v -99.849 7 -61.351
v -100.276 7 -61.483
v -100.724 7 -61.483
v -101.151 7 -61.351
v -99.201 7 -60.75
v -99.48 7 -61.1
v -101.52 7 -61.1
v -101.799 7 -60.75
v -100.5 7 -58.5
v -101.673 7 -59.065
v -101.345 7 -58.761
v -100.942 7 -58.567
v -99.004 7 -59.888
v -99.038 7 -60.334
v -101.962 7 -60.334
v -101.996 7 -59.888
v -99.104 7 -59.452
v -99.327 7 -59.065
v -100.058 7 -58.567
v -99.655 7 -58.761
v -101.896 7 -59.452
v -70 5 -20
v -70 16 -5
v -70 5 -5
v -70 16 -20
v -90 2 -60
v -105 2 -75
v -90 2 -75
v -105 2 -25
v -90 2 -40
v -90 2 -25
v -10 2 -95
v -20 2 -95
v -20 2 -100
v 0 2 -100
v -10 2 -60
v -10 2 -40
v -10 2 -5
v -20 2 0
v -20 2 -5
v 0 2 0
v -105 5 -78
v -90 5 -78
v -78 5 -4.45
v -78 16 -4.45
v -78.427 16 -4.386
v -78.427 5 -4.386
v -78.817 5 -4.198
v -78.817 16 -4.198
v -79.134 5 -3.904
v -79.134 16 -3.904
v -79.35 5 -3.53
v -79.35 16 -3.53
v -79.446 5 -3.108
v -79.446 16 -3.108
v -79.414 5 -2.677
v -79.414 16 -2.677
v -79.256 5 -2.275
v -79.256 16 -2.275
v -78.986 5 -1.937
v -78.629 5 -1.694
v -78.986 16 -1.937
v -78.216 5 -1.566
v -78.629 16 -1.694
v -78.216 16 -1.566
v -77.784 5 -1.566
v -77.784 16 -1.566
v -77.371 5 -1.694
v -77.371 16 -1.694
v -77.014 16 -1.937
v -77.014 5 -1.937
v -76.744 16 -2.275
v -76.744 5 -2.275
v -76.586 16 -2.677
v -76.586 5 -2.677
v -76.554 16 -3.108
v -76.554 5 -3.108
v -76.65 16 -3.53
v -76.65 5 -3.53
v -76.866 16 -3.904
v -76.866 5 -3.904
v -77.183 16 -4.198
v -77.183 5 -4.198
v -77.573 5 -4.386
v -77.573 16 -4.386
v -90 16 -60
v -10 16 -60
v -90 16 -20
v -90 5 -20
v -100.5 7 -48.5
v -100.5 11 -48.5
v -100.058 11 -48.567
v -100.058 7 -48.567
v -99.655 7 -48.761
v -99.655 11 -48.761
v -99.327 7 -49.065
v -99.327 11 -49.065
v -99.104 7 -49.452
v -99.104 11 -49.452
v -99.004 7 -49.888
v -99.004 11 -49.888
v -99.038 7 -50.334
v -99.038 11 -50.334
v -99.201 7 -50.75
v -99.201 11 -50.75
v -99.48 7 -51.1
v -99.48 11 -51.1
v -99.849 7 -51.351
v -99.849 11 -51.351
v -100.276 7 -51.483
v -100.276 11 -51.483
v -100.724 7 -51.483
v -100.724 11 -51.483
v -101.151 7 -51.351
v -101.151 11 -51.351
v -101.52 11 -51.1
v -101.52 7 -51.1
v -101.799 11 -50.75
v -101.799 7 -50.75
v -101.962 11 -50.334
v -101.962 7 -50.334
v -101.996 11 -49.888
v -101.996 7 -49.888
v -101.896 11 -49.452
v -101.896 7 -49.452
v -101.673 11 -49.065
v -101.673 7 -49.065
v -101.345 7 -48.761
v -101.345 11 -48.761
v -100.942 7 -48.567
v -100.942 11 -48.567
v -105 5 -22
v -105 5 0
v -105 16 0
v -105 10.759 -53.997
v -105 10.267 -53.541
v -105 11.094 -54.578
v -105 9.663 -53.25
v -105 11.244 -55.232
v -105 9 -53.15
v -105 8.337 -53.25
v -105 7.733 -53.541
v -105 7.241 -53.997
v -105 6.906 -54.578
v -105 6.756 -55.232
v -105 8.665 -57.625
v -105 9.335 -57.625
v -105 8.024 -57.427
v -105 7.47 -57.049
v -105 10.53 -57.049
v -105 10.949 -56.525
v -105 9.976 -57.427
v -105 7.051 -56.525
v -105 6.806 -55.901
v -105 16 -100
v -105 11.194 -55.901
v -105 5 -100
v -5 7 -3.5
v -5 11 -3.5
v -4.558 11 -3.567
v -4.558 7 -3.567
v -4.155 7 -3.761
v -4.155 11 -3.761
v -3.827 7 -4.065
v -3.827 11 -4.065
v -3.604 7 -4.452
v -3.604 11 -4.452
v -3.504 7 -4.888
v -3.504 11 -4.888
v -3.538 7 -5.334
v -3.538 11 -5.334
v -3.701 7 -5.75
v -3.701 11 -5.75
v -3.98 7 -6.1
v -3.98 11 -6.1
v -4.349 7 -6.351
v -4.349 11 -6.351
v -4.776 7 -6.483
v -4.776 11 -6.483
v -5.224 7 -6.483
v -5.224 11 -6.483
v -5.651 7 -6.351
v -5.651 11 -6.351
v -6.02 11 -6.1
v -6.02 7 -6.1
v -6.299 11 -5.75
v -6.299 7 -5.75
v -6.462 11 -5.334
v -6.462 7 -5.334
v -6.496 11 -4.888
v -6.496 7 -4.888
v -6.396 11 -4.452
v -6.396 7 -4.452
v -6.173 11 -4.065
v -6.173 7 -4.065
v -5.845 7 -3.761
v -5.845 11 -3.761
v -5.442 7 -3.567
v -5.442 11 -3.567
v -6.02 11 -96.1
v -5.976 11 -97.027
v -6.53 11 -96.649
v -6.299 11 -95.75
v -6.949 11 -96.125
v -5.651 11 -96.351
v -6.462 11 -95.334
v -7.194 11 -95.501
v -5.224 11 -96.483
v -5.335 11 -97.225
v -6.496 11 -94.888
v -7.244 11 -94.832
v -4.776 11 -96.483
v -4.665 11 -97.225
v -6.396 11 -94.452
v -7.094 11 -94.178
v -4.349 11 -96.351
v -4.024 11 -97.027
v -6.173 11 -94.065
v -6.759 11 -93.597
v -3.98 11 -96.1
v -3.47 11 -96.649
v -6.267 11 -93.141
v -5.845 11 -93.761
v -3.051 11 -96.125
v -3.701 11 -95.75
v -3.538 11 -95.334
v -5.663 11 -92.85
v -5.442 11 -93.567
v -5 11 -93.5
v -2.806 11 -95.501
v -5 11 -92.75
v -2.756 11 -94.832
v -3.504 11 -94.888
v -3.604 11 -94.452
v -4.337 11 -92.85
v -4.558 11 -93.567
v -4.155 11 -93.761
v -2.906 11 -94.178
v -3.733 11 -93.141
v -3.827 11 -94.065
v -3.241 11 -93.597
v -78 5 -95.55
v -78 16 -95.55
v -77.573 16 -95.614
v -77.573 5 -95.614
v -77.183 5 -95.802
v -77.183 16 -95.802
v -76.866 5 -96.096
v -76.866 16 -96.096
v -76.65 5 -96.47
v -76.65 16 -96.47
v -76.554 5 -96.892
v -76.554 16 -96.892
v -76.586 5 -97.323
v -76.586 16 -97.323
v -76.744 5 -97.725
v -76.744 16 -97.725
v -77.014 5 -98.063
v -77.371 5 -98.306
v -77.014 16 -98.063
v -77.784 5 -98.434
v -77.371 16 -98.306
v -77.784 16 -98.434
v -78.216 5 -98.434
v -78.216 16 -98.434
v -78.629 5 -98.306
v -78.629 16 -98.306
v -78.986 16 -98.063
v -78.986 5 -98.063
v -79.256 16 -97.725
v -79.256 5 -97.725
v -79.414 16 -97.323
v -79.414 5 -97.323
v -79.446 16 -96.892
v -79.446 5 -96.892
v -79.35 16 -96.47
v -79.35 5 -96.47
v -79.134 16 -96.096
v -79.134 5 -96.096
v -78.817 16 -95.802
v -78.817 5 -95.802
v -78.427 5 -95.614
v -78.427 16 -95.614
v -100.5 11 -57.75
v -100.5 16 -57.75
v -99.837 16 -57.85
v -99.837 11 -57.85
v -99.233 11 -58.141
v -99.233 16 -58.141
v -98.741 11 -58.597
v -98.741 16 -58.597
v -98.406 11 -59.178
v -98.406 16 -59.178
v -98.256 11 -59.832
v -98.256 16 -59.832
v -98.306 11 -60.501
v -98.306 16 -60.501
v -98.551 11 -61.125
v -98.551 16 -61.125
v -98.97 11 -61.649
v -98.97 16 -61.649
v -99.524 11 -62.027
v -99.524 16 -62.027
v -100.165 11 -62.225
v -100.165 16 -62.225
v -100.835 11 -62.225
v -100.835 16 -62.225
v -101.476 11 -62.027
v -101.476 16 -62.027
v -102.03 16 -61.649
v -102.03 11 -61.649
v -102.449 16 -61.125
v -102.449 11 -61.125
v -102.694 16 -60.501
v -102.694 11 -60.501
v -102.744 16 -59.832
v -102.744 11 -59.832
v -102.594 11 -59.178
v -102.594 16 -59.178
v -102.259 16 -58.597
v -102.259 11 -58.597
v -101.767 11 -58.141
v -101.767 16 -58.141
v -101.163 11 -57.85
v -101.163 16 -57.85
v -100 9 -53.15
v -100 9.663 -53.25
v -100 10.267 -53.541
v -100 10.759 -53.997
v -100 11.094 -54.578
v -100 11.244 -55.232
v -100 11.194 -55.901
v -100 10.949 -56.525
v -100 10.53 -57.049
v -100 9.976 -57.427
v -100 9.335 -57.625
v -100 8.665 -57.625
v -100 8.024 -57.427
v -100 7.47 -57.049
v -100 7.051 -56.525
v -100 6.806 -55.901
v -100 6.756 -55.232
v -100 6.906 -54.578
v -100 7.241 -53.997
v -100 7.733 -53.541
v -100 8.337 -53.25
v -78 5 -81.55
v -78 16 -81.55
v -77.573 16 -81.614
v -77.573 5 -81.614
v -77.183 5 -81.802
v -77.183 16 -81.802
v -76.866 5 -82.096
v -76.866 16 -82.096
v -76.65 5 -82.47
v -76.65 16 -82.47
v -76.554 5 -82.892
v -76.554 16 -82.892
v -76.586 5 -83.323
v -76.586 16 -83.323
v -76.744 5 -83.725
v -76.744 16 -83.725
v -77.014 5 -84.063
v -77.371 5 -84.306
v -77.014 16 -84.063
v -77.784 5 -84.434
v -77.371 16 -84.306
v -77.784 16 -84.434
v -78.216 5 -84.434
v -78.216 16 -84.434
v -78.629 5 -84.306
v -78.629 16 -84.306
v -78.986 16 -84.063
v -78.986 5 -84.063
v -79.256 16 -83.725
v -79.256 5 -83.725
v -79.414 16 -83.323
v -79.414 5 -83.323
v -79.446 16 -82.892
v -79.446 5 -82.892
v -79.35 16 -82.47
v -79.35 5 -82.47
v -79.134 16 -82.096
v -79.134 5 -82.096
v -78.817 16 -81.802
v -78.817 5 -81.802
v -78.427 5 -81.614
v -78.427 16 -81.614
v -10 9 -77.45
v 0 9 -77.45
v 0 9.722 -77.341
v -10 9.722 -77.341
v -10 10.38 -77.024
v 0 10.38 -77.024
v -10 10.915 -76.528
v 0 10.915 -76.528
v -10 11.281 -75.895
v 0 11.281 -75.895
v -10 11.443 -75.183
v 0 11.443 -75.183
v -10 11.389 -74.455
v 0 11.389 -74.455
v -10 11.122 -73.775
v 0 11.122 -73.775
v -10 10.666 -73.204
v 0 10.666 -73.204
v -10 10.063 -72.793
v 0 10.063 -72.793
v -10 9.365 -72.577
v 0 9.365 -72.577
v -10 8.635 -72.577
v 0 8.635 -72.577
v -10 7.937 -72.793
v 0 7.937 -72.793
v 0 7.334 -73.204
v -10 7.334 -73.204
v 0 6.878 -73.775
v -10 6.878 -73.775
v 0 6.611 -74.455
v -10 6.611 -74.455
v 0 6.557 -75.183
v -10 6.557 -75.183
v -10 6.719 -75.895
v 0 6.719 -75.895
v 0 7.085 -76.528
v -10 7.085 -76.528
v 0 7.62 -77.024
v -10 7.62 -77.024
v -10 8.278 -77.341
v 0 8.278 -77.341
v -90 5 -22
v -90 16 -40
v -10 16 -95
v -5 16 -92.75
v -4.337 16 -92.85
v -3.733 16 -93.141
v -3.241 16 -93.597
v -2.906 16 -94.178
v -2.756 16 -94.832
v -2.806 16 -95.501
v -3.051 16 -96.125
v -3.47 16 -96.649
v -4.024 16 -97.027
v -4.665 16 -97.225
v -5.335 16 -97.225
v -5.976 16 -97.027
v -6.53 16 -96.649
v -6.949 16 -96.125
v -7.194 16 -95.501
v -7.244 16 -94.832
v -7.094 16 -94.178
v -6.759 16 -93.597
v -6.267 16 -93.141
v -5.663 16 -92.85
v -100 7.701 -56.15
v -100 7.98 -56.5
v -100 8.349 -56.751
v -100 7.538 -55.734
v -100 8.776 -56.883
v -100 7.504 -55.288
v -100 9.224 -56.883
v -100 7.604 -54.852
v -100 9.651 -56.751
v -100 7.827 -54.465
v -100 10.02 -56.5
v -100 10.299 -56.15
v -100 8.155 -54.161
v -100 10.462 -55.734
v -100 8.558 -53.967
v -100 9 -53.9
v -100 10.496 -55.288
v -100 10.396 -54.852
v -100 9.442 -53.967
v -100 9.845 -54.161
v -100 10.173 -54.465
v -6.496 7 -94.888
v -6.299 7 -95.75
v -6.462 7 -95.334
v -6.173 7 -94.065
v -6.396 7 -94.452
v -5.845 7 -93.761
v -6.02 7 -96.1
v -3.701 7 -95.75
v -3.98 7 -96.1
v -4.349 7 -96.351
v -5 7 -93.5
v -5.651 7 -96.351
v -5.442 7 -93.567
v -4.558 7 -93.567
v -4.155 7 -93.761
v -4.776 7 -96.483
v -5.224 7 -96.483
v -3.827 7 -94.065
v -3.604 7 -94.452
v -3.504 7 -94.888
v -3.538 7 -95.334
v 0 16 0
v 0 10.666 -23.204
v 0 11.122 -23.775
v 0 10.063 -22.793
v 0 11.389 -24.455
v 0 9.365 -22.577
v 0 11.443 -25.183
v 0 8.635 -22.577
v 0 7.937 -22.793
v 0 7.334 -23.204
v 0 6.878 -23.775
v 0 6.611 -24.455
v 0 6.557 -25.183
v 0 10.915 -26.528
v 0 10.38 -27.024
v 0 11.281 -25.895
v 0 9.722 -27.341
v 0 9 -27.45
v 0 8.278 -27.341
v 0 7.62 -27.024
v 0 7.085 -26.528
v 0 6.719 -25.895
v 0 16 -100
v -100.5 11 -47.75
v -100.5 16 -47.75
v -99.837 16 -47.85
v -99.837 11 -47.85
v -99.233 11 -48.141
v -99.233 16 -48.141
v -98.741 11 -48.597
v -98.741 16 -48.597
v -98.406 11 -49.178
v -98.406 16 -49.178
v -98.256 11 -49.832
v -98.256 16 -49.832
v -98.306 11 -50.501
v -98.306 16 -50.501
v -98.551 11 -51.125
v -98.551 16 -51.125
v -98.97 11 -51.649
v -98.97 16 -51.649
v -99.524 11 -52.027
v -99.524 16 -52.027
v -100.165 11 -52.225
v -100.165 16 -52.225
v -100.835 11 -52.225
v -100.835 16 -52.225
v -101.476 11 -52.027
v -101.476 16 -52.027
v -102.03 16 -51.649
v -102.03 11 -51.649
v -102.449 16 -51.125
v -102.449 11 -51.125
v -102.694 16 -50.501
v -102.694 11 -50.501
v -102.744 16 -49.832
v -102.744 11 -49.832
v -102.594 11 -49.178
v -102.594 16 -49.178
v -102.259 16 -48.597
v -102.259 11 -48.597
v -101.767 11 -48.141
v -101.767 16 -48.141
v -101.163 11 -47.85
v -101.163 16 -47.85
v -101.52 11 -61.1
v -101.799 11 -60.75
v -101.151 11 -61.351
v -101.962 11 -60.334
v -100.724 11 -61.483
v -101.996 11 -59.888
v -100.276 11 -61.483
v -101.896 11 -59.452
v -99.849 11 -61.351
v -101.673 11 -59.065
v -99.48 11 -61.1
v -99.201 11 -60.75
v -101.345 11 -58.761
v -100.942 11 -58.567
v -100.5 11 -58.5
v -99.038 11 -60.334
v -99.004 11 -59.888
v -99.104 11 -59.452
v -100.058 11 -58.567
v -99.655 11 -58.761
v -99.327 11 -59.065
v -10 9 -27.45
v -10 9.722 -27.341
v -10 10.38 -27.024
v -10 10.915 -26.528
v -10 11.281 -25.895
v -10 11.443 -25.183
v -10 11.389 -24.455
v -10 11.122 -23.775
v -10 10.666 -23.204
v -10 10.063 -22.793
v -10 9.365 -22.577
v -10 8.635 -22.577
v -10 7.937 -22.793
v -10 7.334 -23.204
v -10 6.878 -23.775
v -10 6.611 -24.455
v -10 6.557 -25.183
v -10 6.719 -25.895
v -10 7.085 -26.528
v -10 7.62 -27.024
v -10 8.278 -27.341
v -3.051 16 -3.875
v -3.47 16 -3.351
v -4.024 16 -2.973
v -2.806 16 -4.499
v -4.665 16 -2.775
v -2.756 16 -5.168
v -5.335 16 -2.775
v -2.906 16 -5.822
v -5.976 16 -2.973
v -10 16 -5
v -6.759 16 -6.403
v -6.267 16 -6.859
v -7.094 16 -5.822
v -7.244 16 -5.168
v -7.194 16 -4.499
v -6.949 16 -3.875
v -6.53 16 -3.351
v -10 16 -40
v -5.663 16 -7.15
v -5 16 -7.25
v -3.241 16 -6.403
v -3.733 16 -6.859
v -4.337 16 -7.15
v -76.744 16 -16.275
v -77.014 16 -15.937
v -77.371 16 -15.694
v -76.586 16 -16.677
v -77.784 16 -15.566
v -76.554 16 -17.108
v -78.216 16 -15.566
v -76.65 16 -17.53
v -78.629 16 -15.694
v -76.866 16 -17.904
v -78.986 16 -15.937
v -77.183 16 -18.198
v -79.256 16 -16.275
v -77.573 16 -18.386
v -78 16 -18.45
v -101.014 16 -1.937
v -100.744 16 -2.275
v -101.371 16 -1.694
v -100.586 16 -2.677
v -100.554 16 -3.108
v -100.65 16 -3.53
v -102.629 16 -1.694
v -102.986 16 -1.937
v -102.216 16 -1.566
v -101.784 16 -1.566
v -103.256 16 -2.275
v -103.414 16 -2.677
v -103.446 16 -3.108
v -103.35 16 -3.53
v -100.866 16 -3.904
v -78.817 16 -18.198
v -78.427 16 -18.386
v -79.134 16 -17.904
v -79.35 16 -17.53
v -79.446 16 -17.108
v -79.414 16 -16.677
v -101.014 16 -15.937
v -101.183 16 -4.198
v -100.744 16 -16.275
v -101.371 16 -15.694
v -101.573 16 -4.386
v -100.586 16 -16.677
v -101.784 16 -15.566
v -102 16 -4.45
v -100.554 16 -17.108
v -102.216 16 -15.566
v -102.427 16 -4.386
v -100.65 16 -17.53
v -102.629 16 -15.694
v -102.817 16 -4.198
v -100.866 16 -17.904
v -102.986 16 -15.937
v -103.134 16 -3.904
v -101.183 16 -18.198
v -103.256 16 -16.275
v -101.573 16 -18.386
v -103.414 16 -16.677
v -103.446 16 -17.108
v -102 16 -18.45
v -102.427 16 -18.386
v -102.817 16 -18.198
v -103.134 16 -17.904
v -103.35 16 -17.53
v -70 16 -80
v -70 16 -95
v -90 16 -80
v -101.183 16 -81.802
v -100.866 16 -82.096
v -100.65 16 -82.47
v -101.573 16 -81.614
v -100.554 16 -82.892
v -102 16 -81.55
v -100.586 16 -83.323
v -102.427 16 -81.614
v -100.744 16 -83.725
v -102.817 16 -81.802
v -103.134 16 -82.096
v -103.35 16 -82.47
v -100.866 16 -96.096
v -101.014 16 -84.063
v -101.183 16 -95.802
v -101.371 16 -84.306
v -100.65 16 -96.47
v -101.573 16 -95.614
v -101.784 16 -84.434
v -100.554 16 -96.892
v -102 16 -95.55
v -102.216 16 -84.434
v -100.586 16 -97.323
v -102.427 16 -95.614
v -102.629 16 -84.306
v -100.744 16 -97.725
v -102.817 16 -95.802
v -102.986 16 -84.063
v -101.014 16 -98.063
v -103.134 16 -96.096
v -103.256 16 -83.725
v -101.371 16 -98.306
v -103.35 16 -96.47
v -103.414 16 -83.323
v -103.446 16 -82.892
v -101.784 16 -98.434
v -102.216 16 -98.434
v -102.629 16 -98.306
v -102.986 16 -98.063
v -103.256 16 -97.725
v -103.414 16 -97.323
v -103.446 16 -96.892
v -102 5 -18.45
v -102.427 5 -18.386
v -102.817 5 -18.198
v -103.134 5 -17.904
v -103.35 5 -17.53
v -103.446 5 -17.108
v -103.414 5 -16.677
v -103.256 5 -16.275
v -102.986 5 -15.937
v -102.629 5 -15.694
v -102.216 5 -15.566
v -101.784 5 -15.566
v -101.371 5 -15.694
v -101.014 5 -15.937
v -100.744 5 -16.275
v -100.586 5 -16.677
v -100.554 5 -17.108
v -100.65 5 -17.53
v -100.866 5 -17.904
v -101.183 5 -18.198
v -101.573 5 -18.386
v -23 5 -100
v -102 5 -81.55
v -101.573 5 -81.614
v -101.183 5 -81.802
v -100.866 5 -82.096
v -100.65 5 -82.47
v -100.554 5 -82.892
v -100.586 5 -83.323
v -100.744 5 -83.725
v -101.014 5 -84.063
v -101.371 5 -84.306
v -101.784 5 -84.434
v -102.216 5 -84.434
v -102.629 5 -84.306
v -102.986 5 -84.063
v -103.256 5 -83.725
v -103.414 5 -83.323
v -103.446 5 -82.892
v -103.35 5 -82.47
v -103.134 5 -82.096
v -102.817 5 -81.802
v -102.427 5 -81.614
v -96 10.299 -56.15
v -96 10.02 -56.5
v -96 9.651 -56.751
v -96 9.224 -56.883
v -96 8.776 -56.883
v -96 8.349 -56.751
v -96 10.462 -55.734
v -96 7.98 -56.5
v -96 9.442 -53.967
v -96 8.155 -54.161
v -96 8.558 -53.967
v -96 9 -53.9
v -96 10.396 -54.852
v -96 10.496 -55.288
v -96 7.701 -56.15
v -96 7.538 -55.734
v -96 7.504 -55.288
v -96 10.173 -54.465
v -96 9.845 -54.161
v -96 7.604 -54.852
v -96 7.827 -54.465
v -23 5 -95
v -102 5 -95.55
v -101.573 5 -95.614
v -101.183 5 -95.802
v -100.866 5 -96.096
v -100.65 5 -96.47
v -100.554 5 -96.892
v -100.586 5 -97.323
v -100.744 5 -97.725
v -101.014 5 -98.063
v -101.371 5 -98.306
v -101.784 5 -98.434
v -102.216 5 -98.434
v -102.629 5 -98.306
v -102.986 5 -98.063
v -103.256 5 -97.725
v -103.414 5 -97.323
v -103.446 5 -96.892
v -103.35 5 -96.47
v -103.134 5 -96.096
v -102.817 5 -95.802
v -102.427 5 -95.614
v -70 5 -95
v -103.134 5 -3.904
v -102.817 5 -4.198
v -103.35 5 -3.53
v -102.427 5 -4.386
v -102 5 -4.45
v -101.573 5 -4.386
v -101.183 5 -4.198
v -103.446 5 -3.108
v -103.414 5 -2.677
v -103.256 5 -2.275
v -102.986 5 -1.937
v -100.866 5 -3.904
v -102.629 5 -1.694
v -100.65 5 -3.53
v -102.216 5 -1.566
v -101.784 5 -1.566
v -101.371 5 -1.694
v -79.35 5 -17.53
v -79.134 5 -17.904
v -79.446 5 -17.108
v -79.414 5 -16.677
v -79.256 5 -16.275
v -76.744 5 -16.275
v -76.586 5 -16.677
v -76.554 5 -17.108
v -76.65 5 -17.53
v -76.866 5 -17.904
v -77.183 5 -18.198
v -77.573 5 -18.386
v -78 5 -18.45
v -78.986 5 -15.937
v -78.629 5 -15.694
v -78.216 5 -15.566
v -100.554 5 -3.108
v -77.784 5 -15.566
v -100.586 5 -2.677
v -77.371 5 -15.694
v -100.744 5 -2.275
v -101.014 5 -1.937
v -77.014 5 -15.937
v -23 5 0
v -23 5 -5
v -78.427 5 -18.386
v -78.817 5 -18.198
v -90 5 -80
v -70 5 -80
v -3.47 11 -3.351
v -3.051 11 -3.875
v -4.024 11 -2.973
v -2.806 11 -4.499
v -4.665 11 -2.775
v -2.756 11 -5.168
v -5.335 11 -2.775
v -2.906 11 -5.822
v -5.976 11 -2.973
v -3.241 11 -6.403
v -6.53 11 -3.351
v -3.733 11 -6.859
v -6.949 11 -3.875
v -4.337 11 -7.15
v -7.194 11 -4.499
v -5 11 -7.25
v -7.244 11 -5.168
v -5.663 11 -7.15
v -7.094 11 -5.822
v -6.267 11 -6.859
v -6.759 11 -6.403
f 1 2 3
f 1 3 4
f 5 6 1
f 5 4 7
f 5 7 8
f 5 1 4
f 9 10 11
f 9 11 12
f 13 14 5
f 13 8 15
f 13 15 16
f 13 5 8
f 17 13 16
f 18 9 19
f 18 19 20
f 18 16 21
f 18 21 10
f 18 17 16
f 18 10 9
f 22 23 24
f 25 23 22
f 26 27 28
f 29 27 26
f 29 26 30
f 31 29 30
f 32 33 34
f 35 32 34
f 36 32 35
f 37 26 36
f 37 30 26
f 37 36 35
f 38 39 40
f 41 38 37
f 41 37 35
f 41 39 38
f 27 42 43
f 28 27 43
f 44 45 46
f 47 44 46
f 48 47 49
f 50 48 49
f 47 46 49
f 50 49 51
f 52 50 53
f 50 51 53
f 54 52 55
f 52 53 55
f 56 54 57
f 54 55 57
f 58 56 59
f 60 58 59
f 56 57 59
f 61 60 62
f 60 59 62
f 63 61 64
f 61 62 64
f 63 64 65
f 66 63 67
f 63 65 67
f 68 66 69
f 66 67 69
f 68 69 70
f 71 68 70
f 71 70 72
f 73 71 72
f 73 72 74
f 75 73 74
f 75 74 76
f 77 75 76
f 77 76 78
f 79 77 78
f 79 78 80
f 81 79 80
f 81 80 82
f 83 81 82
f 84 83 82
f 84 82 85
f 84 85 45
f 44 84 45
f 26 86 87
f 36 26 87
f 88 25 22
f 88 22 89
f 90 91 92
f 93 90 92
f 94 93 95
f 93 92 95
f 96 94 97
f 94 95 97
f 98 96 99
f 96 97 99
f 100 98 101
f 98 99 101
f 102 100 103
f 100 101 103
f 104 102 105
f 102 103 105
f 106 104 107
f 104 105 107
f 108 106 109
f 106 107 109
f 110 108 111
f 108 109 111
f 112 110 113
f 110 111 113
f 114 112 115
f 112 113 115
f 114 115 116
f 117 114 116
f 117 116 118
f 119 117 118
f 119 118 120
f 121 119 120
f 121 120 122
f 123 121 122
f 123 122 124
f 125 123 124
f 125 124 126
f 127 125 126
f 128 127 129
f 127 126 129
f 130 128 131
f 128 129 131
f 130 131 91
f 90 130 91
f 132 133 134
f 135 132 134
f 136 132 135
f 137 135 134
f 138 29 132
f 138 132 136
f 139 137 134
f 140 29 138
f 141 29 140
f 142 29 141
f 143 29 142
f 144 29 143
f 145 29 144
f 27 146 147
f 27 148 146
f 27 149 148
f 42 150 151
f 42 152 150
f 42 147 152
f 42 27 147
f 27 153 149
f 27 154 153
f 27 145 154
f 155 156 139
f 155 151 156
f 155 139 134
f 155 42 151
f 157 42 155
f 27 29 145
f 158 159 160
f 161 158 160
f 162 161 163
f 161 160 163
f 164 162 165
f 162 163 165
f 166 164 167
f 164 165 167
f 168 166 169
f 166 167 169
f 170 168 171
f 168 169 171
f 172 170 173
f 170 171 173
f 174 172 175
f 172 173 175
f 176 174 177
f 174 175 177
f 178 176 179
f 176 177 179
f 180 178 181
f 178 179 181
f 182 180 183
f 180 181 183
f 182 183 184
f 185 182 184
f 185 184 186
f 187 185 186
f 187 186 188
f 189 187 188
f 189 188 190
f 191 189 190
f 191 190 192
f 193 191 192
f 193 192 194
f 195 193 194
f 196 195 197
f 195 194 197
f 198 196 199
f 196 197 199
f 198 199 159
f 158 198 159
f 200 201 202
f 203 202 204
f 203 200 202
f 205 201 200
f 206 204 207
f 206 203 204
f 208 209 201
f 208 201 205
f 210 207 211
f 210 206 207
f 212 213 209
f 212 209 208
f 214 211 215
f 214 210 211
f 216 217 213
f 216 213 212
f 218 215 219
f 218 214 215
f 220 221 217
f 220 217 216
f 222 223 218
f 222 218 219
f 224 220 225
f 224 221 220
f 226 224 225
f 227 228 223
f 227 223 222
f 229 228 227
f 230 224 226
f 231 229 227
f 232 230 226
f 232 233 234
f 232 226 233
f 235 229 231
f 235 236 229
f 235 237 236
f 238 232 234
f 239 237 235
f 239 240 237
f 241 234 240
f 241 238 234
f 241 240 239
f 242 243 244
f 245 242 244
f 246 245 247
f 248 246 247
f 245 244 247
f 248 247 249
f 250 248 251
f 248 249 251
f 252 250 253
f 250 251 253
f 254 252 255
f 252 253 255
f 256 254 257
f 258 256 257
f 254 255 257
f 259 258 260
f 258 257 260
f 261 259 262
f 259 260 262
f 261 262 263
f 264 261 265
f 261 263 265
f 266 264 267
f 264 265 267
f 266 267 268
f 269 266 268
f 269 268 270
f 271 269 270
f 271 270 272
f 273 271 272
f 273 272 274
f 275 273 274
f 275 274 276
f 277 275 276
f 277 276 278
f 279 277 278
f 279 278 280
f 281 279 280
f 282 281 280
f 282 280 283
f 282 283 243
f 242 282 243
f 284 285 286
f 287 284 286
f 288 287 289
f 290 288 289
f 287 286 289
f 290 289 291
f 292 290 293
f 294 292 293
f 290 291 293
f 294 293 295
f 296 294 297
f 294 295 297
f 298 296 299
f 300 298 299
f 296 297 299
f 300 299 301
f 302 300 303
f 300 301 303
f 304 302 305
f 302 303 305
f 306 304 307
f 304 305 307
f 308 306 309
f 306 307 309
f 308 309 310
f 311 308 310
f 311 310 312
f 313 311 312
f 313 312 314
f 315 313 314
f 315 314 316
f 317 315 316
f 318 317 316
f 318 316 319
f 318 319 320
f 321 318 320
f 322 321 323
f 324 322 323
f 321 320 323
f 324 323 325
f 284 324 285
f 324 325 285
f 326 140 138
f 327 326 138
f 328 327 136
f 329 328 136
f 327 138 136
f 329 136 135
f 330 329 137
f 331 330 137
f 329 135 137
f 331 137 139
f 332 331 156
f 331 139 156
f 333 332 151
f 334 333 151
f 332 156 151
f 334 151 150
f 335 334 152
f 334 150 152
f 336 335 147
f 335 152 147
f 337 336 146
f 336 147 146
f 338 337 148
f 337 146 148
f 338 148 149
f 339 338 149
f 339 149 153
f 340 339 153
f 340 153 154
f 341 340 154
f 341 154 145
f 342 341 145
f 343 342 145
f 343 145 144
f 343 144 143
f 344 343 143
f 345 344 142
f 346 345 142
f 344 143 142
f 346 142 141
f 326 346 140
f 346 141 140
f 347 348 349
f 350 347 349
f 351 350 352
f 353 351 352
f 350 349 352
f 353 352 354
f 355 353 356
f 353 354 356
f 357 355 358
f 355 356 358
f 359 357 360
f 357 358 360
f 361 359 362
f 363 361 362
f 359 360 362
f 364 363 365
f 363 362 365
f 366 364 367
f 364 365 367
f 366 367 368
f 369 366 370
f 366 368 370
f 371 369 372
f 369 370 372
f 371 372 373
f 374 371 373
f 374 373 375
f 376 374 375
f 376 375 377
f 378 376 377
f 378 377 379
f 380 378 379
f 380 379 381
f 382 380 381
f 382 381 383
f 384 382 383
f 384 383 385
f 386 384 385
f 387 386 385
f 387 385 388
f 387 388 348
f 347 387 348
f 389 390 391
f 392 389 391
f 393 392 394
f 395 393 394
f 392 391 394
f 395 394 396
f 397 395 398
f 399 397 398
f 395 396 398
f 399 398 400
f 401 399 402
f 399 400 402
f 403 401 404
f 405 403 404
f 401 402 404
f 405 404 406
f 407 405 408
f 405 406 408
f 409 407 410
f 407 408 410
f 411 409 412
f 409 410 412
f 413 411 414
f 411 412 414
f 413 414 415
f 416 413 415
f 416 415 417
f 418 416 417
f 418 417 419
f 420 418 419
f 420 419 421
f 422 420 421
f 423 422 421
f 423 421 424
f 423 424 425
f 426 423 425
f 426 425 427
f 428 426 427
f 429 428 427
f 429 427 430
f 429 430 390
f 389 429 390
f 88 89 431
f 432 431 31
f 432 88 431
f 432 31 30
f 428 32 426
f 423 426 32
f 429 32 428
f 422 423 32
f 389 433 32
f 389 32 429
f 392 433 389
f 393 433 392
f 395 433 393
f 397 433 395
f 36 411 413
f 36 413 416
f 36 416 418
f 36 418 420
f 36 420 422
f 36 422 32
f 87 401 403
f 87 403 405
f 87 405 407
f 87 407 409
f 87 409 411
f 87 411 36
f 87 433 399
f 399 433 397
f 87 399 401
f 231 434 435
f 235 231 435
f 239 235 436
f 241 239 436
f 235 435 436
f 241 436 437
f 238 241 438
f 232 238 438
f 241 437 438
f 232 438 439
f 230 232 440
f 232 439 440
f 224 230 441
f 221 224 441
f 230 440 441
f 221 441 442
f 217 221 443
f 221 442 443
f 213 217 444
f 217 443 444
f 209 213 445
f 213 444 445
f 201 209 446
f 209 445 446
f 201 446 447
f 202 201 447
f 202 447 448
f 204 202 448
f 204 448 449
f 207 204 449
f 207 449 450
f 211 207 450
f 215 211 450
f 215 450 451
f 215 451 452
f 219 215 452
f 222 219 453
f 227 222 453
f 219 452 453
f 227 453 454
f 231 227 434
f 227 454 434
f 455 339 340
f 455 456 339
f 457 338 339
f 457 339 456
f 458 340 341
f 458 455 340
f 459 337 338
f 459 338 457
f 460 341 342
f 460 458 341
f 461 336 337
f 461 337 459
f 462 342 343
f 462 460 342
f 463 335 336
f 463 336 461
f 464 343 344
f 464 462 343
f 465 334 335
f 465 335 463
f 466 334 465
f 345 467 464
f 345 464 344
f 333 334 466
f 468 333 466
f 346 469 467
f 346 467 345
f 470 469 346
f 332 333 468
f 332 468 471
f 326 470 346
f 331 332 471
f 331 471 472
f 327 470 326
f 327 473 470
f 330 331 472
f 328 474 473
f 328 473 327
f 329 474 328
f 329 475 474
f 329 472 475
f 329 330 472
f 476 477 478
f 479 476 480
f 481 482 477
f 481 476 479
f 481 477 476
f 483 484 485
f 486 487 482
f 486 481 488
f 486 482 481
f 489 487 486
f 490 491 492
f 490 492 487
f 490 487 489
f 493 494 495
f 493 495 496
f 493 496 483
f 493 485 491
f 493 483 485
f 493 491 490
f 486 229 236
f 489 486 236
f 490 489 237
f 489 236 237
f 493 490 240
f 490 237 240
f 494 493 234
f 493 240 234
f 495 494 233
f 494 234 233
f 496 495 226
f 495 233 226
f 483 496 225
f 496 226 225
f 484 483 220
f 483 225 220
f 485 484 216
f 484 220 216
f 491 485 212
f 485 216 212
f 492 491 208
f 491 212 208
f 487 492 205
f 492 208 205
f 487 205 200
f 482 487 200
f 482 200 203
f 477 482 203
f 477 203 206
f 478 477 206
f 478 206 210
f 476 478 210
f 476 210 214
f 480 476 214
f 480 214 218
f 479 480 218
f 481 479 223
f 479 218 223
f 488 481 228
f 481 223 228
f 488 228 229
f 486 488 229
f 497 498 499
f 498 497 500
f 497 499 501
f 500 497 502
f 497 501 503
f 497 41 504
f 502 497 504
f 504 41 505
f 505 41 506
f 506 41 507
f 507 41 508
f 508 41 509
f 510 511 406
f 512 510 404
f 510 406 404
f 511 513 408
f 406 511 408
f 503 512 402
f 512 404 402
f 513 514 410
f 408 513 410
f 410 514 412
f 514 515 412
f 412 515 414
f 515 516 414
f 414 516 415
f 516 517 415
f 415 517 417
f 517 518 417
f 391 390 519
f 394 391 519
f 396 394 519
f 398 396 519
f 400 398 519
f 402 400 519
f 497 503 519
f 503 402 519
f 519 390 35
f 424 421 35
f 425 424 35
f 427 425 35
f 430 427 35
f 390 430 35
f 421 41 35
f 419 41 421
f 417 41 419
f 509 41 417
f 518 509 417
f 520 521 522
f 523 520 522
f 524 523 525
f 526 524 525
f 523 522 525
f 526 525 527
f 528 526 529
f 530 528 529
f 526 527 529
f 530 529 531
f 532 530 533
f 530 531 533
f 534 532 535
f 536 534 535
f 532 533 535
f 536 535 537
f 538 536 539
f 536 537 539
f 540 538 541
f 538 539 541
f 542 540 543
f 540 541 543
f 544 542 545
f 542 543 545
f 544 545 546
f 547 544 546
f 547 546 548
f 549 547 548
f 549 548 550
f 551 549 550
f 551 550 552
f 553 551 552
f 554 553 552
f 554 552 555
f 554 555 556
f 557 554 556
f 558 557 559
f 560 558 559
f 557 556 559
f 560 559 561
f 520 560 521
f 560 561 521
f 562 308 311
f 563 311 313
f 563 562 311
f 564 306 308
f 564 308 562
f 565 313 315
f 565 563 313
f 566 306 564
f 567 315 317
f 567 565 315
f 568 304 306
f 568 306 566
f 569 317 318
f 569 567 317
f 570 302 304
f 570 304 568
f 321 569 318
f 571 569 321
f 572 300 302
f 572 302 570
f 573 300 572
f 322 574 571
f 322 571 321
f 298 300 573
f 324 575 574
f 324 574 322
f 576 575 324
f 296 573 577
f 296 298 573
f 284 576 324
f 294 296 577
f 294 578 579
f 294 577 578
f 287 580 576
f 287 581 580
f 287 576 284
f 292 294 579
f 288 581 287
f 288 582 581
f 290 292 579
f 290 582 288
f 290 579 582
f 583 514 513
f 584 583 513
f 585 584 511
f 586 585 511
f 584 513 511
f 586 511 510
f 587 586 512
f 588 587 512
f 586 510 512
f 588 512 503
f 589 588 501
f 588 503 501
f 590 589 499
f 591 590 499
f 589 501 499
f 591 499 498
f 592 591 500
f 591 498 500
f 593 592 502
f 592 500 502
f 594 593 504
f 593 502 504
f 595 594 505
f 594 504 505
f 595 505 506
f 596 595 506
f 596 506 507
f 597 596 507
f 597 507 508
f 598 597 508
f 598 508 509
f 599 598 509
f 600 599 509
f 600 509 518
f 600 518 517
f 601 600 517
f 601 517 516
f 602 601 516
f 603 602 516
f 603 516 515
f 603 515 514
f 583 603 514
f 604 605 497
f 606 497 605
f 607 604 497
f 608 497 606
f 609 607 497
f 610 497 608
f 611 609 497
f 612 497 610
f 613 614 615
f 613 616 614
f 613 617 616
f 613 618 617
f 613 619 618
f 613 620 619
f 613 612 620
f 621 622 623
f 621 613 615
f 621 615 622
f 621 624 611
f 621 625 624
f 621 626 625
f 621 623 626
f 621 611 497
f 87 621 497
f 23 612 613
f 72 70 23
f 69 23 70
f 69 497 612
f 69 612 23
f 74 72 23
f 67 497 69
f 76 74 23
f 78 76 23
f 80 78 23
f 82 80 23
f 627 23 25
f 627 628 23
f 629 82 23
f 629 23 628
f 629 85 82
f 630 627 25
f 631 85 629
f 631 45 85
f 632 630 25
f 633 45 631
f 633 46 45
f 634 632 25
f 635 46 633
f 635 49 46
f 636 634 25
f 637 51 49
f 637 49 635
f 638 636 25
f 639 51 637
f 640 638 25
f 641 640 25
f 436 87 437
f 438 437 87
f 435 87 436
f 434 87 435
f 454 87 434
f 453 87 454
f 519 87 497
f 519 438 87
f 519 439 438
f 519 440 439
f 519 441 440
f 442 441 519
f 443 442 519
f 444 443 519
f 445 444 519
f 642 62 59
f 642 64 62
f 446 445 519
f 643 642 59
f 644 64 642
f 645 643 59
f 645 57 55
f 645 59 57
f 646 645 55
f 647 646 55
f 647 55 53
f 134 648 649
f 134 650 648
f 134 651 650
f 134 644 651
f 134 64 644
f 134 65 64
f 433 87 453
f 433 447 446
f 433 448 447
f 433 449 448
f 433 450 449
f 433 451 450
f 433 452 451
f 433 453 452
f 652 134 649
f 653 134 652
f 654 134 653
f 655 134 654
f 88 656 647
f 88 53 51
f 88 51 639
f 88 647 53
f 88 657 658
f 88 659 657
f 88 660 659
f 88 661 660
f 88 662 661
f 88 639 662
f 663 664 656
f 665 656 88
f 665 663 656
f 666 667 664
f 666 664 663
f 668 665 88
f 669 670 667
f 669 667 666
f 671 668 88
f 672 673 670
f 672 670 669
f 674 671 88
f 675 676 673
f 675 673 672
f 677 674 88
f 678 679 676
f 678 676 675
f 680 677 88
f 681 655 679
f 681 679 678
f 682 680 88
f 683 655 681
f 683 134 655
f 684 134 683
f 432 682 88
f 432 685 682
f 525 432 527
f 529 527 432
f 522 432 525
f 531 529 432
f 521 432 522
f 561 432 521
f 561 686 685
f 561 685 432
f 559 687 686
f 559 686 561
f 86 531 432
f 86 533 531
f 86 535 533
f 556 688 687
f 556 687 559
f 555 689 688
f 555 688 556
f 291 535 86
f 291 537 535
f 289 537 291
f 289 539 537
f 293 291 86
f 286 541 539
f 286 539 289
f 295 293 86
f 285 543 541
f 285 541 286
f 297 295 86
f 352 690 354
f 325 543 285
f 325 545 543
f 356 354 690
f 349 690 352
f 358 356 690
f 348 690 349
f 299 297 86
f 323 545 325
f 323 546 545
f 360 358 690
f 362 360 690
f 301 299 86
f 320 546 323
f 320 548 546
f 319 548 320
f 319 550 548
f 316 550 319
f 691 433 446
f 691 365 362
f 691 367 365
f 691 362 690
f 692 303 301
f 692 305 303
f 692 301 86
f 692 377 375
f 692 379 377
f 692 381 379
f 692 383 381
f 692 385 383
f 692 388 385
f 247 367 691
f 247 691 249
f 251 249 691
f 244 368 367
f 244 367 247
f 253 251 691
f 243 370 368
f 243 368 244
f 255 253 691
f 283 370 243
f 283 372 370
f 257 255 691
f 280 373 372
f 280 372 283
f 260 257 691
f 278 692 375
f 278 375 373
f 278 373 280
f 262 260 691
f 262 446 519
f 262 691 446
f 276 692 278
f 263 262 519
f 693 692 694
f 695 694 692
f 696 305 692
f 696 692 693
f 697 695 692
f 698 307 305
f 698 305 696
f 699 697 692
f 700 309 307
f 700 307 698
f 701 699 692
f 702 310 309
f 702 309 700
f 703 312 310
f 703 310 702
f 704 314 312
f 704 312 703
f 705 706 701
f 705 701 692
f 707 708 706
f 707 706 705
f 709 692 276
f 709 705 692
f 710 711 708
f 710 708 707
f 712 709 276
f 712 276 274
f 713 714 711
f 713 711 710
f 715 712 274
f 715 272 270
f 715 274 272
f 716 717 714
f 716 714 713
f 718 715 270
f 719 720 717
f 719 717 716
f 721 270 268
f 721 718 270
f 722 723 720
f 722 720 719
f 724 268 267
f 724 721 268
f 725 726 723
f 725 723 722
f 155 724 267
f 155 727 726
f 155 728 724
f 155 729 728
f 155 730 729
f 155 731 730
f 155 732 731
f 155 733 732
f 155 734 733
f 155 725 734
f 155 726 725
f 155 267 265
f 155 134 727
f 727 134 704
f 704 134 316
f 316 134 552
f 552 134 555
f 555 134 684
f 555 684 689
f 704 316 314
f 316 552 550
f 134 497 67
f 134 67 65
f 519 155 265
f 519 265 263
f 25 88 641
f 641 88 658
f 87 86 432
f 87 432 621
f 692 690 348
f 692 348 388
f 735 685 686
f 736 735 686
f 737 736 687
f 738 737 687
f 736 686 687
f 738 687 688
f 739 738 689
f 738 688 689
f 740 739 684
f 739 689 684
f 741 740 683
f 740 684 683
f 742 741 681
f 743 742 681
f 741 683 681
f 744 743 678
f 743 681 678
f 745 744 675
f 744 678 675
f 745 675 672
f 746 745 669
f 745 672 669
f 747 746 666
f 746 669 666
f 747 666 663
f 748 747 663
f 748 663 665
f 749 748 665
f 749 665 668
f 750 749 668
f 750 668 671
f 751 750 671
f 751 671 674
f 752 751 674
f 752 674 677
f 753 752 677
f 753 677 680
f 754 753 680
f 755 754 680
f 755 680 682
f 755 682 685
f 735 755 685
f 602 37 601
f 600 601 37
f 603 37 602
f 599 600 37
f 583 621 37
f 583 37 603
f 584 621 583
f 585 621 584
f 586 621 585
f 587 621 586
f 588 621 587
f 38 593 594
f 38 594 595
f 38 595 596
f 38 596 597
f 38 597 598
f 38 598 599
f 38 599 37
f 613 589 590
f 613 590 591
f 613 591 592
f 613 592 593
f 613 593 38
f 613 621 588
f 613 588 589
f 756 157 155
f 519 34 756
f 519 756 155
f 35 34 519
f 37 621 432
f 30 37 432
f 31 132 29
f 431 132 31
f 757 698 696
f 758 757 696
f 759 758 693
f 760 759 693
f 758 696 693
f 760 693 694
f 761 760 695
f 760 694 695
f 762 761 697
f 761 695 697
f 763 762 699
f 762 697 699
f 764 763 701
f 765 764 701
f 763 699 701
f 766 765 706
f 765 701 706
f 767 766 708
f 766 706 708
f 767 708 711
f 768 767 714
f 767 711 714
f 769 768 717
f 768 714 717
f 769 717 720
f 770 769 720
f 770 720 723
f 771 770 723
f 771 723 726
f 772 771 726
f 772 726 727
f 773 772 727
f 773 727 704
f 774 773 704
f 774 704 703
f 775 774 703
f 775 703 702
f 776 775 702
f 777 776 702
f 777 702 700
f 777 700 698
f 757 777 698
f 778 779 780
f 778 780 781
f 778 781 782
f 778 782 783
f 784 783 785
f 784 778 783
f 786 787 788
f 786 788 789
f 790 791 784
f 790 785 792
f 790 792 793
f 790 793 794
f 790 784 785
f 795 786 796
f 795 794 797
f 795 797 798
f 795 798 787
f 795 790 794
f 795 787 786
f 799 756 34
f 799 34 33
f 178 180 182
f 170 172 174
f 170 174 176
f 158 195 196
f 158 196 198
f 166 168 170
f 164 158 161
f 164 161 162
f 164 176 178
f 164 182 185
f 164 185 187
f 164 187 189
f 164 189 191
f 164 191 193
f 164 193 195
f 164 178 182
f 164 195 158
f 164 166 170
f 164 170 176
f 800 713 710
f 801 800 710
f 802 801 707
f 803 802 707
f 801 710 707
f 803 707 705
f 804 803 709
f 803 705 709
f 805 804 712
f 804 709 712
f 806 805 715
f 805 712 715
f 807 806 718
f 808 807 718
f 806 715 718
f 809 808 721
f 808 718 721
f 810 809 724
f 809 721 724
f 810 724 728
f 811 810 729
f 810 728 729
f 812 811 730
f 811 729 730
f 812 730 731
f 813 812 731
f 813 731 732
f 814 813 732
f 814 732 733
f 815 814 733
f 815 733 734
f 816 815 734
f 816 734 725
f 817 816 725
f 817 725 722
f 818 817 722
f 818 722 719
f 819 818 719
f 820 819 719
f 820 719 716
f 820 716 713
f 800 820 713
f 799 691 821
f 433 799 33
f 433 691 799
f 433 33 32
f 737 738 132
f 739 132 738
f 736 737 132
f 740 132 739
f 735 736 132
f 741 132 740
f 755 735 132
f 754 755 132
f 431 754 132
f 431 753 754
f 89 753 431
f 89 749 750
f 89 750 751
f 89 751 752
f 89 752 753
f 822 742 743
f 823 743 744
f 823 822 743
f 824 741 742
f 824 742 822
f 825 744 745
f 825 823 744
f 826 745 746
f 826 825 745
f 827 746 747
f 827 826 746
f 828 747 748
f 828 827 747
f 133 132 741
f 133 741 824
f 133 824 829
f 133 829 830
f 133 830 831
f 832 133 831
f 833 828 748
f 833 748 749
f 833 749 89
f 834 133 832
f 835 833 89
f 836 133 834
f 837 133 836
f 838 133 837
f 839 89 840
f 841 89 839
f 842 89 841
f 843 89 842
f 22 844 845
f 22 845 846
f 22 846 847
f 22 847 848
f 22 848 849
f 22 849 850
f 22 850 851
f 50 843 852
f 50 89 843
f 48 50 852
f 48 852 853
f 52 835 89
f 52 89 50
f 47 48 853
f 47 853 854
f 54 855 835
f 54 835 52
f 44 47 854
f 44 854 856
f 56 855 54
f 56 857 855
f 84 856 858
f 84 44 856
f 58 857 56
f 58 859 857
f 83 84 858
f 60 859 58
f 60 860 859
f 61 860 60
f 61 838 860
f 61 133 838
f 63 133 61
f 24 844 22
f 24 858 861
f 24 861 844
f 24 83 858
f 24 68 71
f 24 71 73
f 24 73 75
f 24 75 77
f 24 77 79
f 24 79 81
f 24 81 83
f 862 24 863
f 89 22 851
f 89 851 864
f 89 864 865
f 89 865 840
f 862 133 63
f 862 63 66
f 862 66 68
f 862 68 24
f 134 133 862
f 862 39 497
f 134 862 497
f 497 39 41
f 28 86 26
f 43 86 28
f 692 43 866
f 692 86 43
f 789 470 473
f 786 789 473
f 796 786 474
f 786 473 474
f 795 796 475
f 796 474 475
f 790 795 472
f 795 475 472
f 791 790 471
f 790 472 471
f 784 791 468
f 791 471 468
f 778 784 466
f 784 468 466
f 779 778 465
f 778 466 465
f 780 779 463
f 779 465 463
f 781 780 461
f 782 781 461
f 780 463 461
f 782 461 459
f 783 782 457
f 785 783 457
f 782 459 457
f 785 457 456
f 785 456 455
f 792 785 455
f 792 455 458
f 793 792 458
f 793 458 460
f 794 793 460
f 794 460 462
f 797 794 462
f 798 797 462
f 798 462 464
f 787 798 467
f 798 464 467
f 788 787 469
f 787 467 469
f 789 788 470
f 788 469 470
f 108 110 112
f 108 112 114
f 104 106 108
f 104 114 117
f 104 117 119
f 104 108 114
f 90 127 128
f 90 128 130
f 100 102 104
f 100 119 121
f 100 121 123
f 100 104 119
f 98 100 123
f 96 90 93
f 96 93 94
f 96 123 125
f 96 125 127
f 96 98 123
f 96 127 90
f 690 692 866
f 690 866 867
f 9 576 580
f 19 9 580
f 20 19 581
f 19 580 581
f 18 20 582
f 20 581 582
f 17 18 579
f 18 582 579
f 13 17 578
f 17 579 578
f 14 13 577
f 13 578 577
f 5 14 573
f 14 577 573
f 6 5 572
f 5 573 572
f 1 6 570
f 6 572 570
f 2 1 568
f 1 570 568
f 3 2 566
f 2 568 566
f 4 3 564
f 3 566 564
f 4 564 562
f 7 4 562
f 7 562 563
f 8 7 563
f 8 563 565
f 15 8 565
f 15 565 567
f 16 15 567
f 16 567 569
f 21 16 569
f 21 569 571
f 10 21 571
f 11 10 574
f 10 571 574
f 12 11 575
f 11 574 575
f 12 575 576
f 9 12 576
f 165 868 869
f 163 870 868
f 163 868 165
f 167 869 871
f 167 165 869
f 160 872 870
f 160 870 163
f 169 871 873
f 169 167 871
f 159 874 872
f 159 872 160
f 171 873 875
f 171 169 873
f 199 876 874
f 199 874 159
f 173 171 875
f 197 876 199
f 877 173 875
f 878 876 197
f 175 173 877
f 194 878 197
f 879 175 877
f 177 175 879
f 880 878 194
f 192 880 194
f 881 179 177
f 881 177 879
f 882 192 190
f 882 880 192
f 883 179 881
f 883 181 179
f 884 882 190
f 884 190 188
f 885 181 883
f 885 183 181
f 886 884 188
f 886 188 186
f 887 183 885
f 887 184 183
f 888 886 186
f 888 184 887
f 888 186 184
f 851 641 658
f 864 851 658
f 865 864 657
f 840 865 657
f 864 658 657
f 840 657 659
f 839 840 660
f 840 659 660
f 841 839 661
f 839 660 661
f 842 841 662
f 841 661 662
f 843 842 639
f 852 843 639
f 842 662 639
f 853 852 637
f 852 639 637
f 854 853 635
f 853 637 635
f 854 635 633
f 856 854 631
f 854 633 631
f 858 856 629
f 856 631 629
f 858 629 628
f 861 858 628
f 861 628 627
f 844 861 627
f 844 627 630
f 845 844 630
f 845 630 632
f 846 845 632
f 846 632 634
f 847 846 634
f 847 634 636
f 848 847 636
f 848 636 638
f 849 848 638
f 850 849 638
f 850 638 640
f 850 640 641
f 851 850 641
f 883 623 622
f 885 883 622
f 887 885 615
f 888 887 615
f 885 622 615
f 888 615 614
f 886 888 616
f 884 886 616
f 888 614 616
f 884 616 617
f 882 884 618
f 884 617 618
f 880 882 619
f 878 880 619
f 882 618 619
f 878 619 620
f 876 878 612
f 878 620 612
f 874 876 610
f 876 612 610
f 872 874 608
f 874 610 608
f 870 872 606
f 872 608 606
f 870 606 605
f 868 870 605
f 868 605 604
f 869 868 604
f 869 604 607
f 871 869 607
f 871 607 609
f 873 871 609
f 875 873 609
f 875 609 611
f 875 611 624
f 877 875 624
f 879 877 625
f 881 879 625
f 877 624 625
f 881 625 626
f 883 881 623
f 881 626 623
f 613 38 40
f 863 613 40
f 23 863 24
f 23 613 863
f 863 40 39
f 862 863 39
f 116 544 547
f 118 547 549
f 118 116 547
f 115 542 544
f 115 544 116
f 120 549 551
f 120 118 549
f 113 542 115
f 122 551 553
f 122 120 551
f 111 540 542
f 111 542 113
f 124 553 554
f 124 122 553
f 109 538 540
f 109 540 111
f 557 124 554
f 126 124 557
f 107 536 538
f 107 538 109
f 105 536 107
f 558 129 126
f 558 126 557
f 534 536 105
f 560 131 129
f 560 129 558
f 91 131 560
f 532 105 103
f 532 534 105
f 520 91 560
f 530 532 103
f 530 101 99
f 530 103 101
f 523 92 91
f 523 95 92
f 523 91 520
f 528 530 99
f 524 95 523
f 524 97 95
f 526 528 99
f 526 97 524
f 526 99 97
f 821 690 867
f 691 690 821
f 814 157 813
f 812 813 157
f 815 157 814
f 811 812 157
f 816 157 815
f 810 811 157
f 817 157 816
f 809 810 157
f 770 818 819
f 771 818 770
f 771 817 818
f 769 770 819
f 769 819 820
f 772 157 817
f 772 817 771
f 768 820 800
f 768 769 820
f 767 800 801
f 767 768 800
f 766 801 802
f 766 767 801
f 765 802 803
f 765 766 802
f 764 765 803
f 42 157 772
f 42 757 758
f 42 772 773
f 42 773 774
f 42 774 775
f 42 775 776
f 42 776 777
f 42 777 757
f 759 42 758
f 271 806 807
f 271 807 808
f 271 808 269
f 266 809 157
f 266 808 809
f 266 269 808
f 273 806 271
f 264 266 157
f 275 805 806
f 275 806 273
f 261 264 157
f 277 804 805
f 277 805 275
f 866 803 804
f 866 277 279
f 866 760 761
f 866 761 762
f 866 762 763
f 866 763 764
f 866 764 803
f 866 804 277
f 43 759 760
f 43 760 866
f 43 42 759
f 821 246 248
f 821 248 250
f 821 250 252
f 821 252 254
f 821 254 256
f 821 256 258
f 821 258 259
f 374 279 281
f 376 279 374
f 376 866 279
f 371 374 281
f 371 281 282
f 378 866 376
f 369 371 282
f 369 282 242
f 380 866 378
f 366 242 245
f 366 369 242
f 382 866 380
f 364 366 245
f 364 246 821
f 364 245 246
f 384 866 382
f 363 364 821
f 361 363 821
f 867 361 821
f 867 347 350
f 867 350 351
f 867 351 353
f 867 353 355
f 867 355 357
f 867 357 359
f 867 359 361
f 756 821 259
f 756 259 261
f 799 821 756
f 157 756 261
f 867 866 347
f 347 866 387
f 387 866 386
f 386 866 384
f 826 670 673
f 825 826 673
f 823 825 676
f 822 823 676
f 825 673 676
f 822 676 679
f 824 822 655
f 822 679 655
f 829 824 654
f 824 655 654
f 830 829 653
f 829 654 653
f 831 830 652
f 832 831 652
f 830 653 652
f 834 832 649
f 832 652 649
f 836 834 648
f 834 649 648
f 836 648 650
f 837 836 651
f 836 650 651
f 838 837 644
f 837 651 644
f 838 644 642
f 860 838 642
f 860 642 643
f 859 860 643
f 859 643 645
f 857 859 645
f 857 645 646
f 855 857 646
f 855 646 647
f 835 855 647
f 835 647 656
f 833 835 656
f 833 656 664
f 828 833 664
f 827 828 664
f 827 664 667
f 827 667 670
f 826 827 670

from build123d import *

# Parameters (mm, degrees)
SKETCH_1_W           = 105
SKETCH_1_H           = 100
EXTRUDE_1_DEPTH      = 16
CUT_EXTRUDE_5_REACH  = 147.88
SKETCH_8_R           = 1.45
CUT_EXTRUDE_7_DEPTH  = 146.880087743
SKETCH_9_W           = 35
SKETCH_9_H           = 16
EXTRUDE_2_DEPTH      = 5
SKETCH_10_R          = 2.25
CUT_EXTRUDE_8_DEPTH  = 5
SKETCH_12_W          = 20
SKETCH_12_H          = 16
EXTRUDE_3_DEPTH      = 10
SKETCH_13_R          = 2.25
CUT_EXTRUDE_10_DEPTH = 5
SKETCH_14_W          = 105
SKETCH_14_H          = 100
CUT_EXTRUDE_11_DEPTH = 2
SKETCH_15_R          = 1.5
CUT_EXTRUDE_12_DEPTH = 4
SKETCH_16_W          = 85
SKETCH_16_H          = 25
CUT_EXTRUDE_13_DEPTH = 3
CHAMFER_1_SIZE       = 3
SKETCH_17_R          = 2.25
CUT_EXTRUDE_14_DEPTH = 5
SKETCH_18_R          = 1.5
CUT_EXTRUDE_15_DEPTH = 4
SKETCH_21_R          = 2.45
CUT_EXTRUDE_17_DEPTH = 13.2


with BuildPart() as part:
    # 草图1 → 凸台-拉伸1 (new body)
    with BuildSketch(Plane(origin=(0, 0, 0), x_dir=(1, 0, 0), z_dir=(0, 1, 0))):
        with Locations((-52.5, 50)):
            Rectangle(SKETCH_1_W, SKETCH_1_H)
    extrude(amount=EXTRUDE_1_DEPTH)

    # 草图6 → 切除-拉伸5 (cut, up to next)
    with BuildSketch(Plane(origin=(0, 16, 0), x_dir=(1, 0, 0), z_dir=(0, 1, 0)), mode=Mode.PRIVATE) as cut_extrude_5_sk1:
        Polygon((-45.224064051, 40), (-5, 40), (-5, 5), (-70, 5), (-70, 20), (-100, 20), (-100, 40), align=None)
    cut_extrude_5_tool1 = extrude(cut_extrude_5_sk1.sketch, amount=-CUT_EXTRUDE_5_REACH, mode=Mode.PRIVATE) & part.part
    # 草图6 → 切除-拉伸5 (cut, up to next)
    with BuildSketch(Plane(origin=(0, 16, 0), x_dir=(1, 0, 0), z_dir=(0, 1, 0)), mode=Mode.PRIVATE) as cut_extrude_5_sk2:
        Polygon((-70, 95), (-5, 95), (-5, 60), (-45.224064051, 60), (-100, 60), (-100, 80), (-70, 80), align=None)
    cut_extrude_5_tool2 = extrude(cut_extrude_5_sk2.sketch, amount=-CUT_EXTRUDE_5_REACH, mode=Mode.PRIVATE) & part.part
    add(cut_extrude_5_tool1.solids().sort_by_distance((-47.413043, 16, -24.065217))[0], mode=Mode.SUBTRACT)
    add(cut_extrude_5_tool2.solids().sort_by_distance((-47.413043, 16, -75.934783))[0], mode=Mode.SUBTRACT)

    # 草图8 → 切除-拉伸7 (cut, through all)
    with BuildSketch(Plane(origin=(0, 16, 0), x_dir=(1, 0, 0), z_dir=(0, 1, 0))):
        with Locations(Location((-102, 97, 0), (0, 0, 270))):
            Circle(SKETCH_8_R)
        with Locations(Location((-102, 83, 0), (0, 0, 270))):
            Circle(SKETCH_8_R)
        with Locations(Location((-78, 97, 0), (0, 0, 270))):
            Circle(SKETCH_8_R)
        with Locations(Location((-78, 83, 0), (0, 0, 270))):
            Circle(SKETCH_8_R)
        with Locations(Location((-78, 17, 0), (0, 0, 90))):
            Circle(SKETCH_8_R)
        with Locations(Location((-78, 3, 0), (0, 0, 90))):
            Circle(SKETCH_8_R)
        with Locations(Location((-102, 17, 0), (0, 0, 90))):
            Circle(SKETCH_8_R)
        with Locations(Location((-102, 3, 0), (0, 0, 90))):
            Circle(SKETCH_8_R)
    extrude(amount=-CUT_EXTRUDE_7_DEPTH, mode=Mode.SUBTRACT)

    # 草图9 → 凸台-拉伸2 (add)
    with BuildSketch(Plane.ZY.offset(5)):
        with Locations((-22.5, 8)):
            Rectangle(SKETCH_9_W, SKETCH_9_H)
        with Locations((-77.5, 8)):
            Rectangle(SKETCH_9_W, SKETCH_9_H)
    extrude(amount=EXTRUDE_2_DEPTH)

    # 草图10 → 切除-拉伸8 (cut)
    with BuildSketch(Plane(origin=(0, 16, 0), x_dir=(1, 0, 0), z_dir=(0, 1, 0))):
        with Locations(Location((-5, 95, 0), (0, 0, 270))):
            Circle(SKETCH_10_R)
        with Locations(Location((-5, 5, 0), (0, 0, 90))):
            Circle(SKETCH_10_R)
    extrude(amount=-CUT_EXTRUDE_8_DEPTH, mode=Mode.SUBTRACT)

    # 草图12 → 凸台-拉伸3 (add)
    with BuildSketch(Plane(origin=(-100, 0, 0), x_dir=(0, 0, -1), z_dir=(1, 0, 0))):
        with Locations((30, 8)):
            Rectangle(SKETCH_12_W, SKETCH_12_H)
        with Locations((70, 8)):
            Rectangle(SKETCH_12_W, SKETCH_12_H)
    extrude(amount=EXTRUDE_3_DEPTH)

    # 草图13 → 切除-拉伸10 (cut)
    with BuildSketch(Plane(origin=(0, 16, 0), x_dir=(1, 0, 0), z_dir=(0, 1, 0))):
        with Locations(Location((-100.5, 50, 0), (0, 0, 270))):
            Circle(SKETCH_13_R)
        with Locations(Location((-100.5, 60, 0), (0, 0, 270))):
            Circle(SKETCH_13_R)
    extrude(amount=-CUT_EXTRUDE_10_DEPTH, mode=Mode.SUBTRACT)

    # 草图14 → 切除-拉伸11 (cut)
    with BuildSketch(Plane.XZ):
        with Locations((-52.5, -50)):
            Rectangle(SKETCH_14_W, SKETCH_14_H)
    extrude(amount=-CUT_EXTRUDE_11_DEPTH, mode=Mode.SUBTRACT)

    # 草图15 → 切除-拉伸12 (cut)
    with BuildSketch(Plane(origin=(0, 11, 0), x_dir=(1, 0, 0), z_dir=(0, 1, 0))):
        with Locations(Location((-5, 5, 0), (0, 0, 270))):
            Circle(SKETCH_15_R)
        with Locations(Location((-5, 95, 0), (0, 0, 270))):
            Circle(SKETCH_15_R)
        with Locations(Location((-100.5, 60, 0), (0, 0, 270))):
            Circle(SKETCH_15_R)
        with Locations(Location((-100.5, 50, 0), (0, 0, 270))):
            Circle(SKETCH_15_R)
    extrude(amount=-CUT_EXTRUDE_12_DEPTH, mode=Mode.SUBTRACT)

    # 草图16 → 切除-拉伸13 (cut)
    with BuildSketch(Plane.XZ.offset(-2)):
        with Locations((-62.5, -12.5)):
            Rectangle(SKETCH_16_W, SKETCH_16_H)
        with Locations((-62.5, -87.5)):
            Rectangle(SKETCH_16_W, SKETCH_16_H)
    extrude(amount=-CUT_EXTRUDE_13_DEPTH, mode=Mode.SUBTRACT)

    # 倒角1
    chamfer_1_edges = [part.edges().sort_by_distance(p)[0] for p in [
        (-20, 5, -2.5),
        (-97.5, 5, -25),
        (-97.5, 5, -75),
        (-20, 5, -97.5),
    ]]
    chamfer(chamfer_1_edges, length=CHAMFER_1_SIZE - 0.0001)  # a hair under: the kernel refuses the full size

    # 草图17 → 切除-拉伸14 (cut)
    with BuildSketch(Plane.ZY.offset(105)):
        with Locations((-55.4, 9)):
            Circle(SKETCH_17_R)
    extrude(amount=-CUT_EXTRUDE_14_DEPTH, mode=Mode.SUBTRACT)

    # 草图18 → 切除-拉伸15 (cut)
    with BuildSketch(Plane.ZY.offset(100)):
        with Locations((-55.4, 9)):
            Circle(SKETCH_18_R)
    extrude(amount=-CUT_EXTRUDE_15_DEPTH, mode=Mode.SUBTRACT)

    # 草图21 → 切除-拉伸17 (cut)
    with BuildSketch(Plane(origin=(0, 0, 0), x_dir=(0, 0, -1), z_dir=(1, 0, 0))):
        with Locations((25, 9)):
            Circle(SKETCH_21_R)
        with Locations((75, 9)):
            Circle(SKETCH_21_R)
    extrude(amount=-CUT_EXTRUDE_17_DEPTH, mode=Mode.SUBTRACT)


solid = part.part
